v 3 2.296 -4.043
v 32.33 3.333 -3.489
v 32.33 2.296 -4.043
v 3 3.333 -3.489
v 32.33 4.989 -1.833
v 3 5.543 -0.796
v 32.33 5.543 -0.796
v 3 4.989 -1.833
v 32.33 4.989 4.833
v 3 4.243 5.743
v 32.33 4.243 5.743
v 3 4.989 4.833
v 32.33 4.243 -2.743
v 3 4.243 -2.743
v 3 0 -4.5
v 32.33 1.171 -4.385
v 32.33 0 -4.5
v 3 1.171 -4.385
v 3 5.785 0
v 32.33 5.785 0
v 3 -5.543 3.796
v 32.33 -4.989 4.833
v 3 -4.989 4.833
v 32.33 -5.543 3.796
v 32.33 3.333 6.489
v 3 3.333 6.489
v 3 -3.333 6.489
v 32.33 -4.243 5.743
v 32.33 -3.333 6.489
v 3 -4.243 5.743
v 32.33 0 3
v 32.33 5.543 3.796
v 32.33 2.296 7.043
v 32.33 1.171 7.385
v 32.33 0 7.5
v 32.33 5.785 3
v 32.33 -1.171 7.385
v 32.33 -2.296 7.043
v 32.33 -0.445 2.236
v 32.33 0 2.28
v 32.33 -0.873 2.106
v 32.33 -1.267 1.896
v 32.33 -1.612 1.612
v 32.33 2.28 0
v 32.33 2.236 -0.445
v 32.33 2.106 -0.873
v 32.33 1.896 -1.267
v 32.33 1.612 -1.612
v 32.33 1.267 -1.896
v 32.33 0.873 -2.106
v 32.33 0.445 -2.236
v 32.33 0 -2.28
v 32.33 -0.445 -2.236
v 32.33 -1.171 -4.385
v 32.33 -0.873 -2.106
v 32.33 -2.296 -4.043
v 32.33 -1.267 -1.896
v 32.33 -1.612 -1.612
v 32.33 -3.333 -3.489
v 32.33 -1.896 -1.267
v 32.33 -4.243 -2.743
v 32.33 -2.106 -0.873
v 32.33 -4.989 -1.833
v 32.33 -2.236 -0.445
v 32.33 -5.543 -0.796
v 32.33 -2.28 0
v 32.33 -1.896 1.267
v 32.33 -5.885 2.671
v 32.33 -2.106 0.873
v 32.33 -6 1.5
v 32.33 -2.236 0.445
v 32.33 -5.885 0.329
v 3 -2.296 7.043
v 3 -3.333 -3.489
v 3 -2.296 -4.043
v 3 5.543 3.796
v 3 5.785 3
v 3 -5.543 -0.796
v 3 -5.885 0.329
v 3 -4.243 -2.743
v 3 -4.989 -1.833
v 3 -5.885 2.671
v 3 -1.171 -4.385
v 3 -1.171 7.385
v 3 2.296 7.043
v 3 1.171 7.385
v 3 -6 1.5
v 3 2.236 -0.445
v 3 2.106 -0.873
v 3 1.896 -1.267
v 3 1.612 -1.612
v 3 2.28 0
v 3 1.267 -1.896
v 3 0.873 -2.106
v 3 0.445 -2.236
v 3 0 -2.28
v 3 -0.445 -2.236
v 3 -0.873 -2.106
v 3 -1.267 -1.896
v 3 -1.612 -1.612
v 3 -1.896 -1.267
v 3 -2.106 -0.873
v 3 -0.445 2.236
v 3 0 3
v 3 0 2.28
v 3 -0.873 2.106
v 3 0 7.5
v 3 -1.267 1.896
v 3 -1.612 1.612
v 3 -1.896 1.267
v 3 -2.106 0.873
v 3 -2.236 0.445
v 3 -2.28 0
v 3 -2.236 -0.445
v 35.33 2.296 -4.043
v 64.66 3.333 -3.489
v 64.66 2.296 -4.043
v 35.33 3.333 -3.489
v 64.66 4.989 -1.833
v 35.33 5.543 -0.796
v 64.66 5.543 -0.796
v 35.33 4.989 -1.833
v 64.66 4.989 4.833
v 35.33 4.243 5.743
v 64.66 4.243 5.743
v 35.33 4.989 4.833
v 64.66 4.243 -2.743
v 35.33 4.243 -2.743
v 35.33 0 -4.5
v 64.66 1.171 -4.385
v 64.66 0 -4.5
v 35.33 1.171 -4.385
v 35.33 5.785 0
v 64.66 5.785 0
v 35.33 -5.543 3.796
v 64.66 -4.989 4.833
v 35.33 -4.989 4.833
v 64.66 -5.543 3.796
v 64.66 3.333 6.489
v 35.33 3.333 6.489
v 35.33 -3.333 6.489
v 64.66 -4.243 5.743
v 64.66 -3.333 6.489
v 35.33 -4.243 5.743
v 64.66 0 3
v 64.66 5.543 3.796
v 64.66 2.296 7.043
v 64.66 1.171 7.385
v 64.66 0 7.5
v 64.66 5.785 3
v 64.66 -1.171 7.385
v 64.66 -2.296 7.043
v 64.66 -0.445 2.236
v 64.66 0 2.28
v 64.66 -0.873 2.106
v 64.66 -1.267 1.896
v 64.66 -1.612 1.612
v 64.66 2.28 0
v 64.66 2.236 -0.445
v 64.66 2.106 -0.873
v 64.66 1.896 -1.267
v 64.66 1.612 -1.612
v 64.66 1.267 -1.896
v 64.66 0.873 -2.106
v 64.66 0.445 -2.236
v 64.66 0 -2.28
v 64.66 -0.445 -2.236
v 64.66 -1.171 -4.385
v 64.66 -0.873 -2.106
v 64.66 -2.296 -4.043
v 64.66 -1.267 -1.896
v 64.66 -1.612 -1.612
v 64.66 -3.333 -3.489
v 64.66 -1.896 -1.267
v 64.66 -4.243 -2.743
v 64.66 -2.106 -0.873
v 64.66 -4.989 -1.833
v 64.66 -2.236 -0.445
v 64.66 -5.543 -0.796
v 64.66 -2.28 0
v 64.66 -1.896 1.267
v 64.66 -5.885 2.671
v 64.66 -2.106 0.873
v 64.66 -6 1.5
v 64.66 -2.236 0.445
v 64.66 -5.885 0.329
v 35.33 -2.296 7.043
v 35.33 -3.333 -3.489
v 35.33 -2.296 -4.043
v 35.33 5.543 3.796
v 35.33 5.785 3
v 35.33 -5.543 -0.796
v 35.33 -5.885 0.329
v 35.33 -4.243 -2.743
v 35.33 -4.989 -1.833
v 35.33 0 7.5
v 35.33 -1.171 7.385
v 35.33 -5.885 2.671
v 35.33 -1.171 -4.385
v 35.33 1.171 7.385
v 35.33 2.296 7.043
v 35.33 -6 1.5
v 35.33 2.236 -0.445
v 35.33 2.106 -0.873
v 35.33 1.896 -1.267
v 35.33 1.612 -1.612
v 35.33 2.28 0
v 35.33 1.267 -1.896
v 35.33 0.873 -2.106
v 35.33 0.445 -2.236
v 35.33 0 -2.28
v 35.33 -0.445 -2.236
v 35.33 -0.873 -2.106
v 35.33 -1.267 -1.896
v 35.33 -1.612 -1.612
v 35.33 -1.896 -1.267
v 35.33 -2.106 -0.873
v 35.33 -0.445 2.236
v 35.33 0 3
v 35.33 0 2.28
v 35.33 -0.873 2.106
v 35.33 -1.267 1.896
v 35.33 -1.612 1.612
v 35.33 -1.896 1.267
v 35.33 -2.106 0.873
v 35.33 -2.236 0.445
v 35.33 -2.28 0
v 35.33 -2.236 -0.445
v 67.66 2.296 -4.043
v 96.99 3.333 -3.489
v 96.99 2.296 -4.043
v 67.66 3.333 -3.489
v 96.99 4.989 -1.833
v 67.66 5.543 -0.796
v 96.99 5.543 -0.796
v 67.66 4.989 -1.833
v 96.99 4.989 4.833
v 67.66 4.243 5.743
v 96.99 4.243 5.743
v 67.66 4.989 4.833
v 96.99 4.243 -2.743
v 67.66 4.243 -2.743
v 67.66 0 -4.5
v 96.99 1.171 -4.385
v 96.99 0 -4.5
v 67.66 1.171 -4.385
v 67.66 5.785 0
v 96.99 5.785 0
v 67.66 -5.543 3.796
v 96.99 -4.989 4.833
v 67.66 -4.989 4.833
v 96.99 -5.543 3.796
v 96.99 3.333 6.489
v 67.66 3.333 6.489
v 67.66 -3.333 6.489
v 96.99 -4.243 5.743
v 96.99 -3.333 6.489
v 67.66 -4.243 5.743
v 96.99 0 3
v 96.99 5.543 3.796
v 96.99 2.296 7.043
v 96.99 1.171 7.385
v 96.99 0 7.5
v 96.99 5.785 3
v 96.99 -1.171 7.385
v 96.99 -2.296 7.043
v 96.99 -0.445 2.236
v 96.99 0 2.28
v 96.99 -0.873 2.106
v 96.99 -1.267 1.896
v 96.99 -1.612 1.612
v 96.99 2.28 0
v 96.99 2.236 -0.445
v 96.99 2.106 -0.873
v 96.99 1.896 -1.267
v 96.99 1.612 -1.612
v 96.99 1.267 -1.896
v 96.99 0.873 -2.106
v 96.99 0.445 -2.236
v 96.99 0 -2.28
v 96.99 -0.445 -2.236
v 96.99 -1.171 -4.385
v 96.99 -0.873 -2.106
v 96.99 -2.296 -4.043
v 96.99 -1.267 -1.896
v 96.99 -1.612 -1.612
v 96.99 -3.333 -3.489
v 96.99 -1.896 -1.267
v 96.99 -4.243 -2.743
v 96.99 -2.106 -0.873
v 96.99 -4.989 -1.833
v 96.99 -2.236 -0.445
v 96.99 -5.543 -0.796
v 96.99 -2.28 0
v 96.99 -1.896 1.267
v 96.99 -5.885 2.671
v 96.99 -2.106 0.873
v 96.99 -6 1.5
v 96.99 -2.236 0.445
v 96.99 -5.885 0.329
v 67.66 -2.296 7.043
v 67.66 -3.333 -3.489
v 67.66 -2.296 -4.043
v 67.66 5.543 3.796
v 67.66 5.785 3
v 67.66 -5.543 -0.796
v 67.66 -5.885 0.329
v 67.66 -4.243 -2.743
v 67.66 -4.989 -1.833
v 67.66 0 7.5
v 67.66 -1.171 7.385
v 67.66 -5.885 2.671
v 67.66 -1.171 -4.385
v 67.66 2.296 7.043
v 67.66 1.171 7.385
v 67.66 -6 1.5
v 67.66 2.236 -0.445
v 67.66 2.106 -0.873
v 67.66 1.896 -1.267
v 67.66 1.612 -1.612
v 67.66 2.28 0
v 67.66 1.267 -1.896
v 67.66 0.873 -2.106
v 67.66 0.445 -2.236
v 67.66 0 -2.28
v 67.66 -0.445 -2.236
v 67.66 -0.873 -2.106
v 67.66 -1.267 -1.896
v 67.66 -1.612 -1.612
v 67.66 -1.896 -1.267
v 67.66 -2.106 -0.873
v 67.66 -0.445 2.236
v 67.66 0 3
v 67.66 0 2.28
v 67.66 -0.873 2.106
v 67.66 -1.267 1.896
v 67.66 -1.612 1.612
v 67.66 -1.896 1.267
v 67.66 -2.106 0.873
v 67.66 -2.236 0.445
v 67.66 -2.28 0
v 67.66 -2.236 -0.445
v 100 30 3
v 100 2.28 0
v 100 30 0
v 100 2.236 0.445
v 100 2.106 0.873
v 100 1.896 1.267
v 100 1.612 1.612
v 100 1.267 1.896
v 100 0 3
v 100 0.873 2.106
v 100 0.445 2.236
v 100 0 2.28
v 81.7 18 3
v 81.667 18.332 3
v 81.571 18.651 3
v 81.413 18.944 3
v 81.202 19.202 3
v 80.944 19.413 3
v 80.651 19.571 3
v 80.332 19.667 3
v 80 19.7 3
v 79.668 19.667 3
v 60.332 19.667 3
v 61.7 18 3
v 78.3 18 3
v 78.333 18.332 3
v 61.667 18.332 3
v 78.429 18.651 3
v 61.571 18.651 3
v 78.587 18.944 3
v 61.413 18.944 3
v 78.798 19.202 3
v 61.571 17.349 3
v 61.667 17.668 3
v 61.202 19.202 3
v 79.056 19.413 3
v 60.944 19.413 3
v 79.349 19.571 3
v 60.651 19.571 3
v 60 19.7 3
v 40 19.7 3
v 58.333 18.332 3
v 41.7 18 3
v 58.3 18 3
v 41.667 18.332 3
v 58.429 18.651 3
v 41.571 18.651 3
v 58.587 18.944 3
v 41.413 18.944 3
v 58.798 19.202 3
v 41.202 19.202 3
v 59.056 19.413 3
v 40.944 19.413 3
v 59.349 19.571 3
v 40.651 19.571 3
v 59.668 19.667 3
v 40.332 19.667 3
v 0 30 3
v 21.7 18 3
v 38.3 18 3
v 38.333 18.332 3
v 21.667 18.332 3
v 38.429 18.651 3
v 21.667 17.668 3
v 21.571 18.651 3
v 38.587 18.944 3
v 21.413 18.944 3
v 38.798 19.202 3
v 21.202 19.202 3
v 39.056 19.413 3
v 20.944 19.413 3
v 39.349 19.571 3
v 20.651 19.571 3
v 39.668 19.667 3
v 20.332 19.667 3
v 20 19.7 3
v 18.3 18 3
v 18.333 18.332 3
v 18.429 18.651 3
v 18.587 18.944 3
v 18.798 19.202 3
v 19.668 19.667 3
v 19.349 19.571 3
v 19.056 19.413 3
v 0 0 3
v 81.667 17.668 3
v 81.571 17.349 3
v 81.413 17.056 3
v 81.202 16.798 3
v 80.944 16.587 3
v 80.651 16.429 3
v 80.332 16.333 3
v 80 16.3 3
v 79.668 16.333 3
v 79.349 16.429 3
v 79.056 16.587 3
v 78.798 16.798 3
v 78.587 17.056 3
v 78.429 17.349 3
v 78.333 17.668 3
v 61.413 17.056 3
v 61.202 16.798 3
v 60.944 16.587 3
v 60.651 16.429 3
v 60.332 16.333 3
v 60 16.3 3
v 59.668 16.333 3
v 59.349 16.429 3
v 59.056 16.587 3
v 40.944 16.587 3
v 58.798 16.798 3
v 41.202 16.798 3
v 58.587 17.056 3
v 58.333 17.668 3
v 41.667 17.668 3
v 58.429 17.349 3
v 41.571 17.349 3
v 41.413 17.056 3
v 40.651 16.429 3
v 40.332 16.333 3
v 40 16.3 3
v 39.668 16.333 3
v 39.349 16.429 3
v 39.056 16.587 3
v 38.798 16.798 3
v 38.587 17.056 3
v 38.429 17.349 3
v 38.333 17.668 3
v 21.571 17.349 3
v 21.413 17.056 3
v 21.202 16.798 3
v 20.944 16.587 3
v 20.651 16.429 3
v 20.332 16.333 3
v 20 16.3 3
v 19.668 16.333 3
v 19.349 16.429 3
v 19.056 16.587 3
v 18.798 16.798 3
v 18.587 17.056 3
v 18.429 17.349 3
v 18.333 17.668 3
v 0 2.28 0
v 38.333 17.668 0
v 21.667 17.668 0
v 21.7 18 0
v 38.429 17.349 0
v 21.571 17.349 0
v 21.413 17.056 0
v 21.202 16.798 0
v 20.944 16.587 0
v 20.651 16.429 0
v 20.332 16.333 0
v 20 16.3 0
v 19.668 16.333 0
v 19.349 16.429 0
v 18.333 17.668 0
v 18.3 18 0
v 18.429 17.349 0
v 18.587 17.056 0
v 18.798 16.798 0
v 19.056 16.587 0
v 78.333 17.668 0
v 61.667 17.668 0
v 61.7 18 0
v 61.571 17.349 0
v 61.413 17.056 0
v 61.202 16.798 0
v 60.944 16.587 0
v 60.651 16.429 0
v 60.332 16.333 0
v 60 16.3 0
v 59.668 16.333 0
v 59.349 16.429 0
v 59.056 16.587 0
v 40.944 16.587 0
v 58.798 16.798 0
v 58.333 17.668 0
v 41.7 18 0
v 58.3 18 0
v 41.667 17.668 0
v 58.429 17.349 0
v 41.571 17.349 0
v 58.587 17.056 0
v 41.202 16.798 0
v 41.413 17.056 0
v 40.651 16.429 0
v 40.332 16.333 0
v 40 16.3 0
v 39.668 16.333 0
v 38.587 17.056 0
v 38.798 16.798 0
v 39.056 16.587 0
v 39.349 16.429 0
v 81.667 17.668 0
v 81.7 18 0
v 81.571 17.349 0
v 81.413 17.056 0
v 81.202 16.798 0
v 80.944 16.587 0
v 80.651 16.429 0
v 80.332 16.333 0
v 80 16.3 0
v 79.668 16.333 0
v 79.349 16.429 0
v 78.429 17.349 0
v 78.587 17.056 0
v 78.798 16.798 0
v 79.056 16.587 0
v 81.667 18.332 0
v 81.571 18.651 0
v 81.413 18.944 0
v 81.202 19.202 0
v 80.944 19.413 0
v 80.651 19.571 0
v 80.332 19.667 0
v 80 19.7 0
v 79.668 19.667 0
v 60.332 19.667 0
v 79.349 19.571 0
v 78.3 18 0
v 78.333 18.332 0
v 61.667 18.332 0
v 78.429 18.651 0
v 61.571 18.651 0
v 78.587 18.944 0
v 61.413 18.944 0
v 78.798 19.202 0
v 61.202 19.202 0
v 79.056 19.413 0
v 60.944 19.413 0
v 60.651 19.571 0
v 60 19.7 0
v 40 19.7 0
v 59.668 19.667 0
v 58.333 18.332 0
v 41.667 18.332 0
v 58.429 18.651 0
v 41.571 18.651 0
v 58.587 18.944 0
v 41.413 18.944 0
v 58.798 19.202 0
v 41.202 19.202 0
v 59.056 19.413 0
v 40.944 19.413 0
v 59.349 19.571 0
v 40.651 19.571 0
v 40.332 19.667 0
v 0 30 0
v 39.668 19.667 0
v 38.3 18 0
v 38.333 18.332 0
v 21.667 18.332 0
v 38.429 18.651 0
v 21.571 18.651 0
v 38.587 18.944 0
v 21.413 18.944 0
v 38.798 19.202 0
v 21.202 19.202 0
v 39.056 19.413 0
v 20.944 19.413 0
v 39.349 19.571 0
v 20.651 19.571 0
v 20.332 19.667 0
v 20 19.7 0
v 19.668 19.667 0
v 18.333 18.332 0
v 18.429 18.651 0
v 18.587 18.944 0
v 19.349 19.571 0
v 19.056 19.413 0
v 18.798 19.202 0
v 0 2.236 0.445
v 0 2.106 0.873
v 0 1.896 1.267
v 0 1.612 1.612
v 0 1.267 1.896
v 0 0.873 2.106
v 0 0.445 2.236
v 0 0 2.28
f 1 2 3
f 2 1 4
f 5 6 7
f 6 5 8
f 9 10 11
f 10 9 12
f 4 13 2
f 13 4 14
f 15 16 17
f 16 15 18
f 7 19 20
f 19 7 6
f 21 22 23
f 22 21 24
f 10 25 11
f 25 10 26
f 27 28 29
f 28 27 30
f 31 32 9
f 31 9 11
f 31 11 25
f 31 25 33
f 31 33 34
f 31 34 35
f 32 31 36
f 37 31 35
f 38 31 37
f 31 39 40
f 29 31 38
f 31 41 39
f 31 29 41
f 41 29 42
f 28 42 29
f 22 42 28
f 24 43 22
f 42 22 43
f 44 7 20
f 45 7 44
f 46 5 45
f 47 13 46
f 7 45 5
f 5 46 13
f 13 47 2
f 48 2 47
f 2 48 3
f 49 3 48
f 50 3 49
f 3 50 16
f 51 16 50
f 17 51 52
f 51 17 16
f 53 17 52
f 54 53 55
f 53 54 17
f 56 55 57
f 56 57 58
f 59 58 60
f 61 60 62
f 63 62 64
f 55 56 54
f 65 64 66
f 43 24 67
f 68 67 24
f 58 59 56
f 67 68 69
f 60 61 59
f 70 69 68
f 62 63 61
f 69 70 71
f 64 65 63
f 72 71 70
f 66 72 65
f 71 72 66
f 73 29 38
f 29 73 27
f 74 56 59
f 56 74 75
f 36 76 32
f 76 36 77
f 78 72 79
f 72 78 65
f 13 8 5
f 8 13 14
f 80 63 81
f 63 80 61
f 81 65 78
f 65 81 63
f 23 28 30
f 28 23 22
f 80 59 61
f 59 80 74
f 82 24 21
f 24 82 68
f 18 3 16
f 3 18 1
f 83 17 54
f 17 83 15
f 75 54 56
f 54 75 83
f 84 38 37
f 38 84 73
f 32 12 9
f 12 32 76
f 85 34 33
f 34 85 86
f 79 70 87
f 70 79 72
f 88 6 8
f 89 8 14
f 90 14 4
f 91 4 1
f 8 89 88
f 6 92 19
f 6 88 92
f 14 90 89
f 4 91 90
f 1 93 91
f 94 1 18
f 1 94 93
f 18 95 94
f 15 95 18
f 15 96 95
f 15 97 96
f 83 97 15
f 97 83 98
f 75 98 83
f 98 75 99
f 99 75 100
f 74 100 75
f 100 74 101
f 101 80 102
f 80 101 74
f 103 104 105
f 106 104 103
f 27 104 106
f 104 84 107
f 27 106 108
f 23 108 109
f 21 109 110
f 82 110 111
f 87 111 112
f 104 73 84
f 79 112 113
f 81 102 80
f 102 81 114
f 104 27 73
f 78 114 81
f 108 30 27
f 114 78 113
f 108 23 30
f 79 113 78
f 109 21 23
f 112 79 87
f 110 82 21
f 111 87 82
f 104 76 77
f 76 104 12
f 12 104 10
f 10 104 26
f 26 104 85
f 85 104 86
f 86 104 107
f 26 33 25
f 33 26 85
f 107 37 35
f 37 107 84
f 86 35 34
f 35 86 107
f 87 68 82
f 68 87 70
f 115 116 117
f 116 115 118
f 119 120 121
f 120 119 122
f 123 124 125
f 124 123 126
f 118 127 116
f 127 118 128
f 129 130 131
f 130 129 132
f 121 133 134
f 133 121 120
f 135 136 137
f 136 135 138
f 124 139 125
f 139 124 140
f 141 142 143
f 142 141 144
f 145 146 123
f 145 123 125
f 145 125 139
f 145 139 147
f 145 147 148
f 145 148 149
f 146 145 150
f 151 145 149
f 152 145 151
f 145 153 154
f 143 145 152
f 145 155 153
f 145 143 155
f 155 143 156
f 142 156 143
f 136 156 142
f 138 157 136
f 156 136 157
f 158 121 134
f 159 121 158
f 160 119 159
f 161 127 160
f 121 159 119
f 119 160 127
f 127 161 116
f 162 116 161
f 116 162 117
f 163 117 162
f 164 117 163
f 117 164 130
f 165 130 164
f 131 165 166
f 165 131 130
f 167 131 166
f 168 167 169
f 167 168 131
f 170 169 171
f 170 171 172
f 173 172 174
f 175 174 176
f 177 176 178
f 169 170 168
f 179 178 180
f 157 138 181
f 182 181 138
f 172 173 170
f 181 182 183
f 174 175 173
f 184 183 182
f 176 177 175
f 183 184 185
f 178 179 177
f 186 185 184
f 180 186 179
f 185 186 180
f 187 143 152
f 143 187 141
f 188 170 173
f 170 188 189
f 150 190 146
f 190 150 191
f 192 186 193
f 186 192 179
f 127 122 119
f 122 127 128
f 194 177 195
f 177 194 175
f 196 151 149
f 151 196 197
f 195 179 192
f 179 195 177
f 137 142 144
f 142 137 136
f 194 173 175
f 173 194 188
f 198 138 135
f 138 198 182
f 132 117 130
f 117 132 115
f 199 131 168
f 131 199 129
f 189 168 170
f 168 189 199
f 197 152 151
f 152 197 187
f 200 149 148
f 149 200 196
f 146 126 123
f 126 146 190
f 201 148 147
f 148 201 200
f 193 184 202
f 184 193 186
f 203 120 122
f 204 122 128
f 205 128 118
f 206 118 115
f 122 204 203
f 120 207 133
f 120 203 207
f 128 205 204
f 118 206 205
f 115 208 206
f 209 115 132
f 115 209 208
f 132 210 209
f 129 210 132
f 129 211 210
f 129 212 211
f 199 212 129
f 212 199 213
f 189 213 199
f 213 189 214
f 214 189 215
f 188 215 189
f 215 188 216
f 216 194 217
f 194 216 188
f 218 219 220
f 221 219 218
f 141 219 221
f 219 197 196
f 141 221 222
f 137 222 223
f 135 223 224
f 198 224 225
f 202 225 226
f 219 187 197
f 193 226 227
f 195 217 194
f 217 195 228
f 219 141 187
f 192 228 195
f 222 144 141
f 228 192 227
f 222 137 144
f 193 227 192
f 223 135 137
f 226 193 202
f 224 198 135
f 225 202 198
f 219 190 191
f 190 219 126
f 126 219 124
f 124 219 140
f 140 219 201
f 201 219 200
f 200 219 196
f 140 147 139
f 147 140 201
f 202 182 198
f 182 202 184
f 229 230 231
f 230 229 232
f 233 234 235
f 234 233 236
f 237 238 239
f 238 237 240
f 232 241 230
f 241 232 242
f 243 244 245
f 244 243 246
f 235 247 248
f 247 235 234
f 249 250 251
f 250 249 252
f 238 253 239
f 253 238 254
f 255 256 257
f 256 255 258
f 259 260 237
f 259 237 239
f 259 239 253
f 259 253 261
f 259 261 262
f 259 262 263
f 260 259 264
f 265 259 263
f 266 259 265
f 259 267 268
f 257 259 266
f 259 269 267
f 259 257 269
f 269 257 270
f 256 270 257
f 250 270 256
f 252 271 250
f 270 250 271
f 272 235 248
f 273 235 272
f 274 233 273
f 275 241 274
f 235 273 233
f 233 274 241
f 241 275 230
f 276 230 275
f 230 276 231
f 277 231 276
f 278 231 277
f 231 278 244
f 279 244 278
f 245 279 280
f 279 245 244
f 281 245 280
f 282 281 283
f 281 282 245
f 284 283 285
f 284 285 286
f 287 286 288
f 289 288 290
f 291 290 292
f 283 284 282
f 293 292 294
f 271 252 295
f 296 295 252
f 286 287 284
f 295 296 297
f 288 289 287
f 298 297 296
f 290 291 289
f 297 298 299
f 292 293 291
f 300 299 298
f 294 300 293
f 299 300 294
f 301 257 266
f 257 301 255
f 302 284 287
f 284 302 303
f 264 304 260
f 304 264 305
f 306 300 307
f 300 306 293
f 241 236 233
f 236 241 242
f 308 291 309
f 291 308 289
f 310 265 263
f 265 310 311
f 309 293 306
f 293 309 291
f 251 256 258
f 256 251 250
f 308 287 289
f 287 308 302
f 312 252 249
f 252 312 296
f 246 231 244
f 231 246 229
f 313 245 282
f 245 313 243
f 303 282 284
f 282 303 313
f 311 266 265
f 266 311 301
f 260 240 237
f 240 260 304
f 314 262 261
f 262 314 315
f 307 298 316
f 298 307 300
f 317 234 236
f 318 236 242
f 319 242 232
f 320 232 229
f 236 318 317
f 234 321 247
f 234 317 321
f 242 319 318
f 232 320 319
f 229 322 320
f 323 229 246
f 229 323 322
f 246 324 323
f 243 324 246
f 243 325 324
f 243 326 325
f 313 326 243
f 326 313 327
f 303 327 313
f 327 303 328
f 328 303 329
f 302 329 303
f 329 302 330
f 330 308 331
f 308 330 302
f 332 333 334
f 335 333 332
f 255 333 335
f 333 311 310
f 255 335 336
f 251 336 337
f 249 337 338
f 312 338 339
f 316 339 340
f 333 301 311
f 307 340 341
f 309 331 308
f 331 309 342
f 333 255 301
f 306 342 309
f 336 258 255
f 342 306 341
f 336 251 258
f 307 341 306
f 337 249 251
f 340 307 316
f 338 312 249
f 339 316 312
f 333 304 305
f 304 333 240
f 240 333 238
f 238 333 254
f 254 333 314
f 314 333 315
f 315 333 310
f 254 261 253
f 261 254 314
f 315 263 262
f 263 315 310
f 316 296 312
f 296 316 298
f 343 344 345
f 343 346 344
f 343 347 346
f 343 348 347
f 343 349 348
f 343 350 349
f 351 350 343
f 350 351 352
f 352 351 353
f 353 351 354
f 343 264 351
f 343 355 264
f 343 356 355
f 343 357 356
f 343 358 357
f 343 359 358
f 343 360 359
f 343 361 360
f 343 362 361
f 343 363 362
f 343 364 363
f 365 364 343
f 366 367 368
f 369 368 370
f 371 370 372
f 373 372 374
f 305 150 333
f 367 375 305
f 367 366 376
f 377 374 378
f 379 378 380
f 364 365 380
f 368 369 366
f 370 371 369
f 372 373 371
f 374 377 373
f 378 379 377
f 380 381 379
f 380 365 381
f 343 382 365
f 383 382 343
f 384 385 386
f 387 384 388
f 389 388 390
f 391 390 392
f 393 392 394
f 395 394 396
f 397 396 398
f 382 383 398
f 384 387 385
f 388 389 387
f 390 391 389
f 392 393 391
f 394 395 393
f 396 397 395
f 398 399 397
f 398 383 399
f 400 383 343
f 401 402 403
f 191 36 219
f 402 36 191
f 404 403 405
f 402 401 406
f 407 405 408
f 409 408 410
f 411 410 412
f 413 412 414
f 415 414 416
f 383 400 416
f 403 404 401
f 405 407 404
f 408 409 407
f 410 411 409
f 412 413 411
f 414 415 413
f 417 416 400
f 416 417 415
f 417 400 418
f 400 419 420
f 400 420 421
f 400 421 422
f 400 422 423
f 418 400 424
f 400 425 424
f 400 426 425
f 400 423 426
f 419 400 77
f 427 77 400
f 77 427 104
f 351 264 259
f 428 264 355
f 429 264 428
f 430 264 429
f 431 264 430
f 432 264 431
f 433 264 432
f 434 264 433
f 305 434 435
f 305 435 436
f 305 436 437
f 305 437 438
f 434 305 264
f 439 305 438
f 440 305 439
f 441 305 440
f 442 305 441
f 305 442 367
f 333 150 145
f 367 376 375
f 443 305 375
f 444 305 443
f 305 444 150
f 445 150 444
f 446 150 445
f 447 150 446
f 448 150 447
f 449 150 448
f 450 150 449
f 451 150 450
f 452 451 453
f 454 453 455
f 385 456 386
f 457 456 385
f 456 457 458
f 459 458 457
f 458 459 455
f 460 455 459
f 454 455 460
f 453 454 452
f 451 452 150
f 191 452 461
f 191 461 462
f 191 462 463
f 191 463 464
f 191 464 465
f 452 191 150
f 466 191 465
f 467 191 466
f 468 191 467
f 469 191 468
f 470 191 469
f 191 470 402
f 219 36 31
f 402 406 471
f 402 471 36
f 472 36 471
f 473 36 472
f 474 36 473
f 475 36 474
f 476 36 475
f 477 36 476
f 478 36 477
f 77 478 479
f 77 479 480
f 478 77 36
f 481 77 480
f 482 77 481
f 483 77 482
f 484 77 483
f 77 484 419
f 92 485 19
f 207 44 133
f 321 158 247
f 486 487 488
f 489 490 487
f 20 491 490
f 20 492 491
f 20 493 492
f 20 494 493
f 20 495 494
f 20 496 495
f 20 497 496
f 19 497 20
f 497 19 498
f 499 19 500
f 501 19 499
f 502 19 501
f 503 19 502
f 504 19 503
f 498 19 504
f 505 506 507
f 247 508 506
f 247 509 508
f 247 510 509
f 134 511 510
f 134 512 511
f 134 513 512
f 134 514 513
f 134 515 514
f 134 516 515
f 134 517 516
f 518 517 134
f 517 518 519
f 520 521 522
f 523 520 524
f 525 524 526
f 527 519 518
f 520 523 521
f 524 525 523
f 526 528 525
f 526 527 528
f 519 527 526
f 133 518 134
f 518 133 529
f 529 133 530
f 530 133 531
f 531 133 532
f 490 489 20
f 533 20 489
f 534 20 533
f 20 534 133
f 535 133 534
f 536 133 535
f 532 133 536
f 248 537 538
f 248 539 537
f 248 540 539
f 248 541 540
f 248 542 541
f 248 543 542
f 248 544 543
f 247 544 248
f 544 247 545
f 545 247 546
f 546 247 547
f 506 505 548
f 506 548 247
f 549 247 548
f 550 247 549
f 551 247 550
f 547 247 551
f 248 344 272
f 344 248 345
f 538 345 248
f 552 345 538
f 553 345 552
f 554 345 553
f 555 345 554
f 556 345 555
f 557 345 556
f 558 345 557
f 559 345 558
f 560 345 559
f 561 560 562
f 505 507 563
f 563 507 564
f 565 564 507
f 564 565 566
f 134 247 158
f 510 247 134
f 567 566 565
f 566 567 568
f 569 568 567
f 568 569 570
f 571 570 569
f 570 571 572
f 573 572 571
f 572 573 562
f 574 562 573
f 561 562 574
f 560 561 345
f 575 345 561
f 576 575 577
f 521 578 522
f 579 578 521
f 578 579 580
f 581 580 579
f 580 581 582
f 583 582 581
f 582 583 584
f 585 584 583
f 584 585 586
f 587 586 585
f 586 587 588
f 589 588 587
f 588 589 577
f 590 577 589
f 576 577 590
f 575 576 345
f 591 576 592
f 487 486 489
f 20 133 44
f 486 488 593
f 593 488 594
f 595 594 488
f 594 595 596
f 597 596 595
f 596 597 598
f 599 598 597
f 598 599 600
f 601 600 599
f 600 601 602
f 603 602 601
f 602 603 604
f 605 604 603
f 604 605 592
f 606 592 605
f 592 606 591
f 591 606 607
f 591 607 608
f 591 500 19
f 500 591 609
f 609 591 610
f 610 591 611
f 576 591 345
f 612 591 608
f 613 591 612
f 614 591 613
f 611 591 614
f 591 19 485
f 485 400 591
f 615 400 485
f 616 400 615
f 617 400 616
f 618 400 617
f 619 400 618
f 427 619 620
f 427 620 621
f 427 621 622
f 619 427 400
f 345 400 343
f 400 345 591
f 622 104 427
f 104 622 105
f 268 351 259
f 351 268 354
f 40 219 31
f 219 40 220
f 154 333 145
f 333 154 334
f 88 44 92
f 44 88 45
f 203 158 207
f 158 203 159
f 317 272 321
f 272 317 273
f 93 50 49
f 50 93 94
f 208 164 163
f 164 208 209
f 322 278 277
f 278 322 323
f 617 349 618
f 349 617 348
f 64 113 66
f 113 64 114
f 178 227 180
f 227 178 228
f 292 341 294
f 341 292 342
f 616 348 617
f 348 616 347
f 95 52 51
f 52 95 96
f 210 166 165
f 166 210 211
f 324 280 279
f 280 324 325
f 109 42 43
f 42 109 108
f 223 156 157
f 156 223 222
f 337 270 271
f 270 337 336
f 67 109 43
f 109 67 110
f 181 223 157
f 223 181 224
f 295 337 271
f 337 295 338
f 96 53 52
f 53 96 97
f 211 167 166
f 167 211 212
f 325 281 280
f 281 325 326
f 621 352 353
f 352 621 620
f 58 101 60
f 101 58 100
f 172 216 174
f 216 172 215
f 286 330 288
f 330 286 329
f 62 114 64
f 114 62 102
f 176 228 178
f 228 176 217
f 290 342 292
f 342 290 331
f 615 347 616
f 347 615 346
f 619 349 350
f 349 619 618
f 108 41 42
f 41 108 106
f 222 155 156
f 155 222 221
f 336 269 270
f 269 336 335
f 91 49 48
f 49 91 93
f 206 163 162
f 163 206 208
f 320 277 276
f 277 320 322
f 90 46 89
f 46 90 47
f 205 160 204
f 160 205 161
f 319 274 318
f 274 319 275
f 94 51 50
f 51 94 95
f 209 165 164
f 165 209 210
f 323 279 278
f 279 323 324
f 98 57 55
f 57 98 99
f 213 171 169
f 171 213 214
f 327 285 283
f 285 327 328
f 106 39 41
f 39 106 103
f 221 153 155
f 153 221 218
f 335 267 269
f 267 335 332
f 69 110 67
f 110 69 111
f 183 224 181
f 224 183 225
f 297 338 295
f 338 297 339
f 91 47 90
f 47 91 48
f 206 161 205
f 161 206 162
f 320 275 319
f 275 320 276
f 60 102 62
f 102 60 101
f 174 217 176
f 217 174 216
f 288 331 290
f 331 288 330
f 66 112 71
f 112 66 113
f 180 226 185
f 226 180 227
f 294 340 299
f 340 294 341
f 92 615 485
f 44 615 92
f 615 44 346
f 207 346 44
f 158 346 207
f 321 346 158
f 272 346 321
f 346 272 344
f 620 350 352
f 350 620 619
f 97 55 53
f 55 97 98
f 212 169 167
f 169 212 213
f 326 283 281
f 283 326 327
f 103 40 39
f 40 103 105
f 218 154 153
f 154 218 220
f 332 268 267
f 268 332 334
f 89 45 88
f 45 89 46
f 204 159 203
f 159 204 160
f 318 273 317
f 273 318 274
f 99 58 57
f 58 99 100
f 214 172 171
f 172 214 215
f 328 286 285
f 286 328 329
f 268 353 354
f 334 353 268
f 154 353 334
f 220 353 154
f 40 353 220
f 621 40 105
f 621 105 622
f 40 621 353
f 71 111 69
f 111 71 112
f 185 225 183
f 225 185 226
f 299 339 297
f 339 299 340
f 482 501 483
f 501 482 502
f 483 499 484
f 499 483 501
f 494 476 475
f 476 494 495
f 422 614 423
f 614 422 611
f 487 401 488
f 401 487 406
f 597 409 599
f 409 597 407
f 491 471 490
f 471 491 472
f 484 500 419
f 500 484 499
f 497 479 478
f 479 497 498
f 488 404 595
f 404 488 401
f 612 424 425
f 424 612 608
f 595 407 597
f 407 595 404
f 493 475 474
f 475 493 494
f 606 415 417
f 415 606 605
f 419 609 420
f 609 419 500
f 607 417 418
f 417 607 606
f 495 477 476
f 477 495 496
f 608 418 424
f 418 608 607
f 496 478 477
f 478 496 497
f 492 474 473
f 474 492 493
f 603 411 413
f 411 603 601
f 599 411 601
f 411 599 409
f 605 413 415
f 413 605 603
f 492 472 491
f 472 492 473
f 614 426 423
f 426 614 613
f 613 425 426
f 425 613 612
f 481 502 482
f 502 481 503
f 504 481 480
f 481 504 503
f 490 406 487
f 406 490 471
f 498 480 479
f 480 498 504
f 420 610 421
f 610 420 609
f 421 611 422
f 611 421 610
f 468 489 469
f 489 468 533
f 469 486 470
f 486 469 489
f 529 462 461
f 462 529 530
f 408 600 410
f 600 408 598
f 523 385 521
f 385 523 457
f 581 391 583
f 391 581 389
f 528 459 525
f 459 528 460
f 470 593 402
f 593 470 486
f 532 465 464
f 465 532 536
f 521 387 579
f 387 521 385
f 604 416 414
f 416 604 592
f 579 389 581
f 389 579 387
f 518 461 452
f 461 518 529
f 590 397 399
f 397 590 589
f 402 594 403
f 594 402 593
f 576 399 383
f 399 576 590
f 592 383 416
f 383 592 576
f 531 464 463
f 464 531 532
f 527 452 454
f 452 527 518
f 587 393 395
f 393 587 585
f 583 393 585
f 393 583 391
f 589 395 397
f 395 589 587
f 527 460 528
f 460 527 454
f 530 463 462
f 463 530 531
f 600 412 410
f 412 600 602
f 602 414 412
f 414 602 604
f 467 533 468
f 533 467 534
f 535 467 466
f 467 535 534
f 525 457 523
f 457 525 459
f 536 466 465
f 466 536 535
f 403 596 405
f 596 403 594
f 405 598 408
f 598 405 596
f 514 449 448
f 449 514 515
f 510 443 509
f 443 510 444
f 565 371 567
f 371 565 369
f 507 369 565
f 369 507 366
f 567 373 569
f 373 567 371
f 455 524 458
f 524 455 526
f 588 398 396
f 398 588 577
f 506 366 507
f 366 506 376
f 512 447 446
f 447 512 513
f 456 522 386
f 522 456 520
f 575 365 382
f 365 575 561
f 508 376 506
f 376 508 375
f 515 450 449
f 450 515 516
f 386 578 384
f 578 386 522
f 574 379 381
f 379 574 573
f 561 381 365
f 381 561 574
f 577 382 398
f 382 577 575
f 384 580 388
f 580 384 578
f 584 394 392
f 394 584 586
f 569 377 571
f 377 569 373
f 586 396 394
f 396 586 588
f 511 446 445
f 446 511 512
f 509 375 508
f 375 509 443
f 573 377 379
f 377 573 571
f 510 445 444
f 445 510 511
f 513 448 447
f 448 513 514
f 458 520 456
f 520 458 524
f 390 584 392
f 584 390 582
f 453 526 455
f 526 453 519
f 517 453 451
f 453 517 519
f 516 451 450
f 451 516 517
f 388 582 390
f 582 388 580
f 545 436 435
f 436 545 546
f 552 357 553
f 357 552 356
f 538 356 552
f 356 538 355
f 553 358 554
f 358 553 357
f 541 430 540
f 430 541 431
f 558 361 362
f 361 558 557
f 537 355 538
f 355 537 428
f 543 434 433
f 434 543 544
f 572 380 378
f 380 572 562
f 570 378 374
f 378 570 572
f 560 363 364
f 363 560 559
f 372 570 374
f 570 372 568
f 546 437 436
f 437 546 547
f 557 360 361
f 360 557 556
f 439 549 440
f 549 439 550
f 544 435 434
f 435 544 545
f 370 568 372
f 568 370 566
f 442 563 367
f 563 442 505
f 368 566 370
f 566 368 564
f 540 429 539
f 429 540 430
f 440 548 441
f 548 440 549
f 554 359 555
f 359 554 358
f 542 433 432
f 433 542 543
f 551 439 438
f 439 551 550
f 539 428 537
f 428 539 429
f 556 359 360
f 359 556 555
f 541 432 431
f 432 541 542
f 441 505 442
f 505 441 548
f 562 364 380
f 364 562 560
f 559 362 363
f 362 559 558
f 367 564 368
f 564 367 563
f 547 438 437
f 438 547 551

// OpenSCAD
$fn = 32;

// ----------------------------------------------------------------------
// Hinge leaf: 100 x 36 x 12 mm
// ----------------------------------------------------------------------

// --- parameters (mm) ---
leaf_len = 100;           // leaf length, X
leaf_w = 30;              // leaf width, Y
leaf_t = 3;               // leaf thickness
knuckle_d = 12;           // knuckle diameter
knuckle_w = 29.33;        // knuckle width
knuckle_n = 3;            // number of knuckles
pin_d = 4.56;             // pin bore
gap = 3;                  // gap between the knuckles
screw_d = 3.4;            // screw clearance

module leaf() {
  cube([leaf_len, leaf_w, leaf_t]);
}

module knuckles() {
  /* barrels sit on the leaf edge, the pin axis at half the leaf thickness */
  for (i = [0 : knuckle_n - 1])
    translate([gap + i * (knuckle_w + gap), 0, leaf_t * 0.5])
      rotate([0, 90, 0]) cylinder(h = knuckle_w, d = knuckle_d);
}

difference() {
  union() {
    leaf();
    knuckles();
  }
  rotate([0, 90, 0]) translate([0, 0, -1])
    cylinder(h = leaf_len + 2, d = pin_d);
  translate([20, leaf_w * 0.6, -1]) cylinder(h = leaf_t + 2, d = screw_d);
  translate([40, leaf_w * 0.6, -1]) cylinder(h = leaf_t + 2, d = screw_d);
  translate([60, leaf_w * 0.6, -1]) cylinder(h = leaf_t + 2, d = screw_d);
  translate([80, leaf_w * 0.6, -1]) cylinder(h = leaf_t + 2, d = screw_d);
}
